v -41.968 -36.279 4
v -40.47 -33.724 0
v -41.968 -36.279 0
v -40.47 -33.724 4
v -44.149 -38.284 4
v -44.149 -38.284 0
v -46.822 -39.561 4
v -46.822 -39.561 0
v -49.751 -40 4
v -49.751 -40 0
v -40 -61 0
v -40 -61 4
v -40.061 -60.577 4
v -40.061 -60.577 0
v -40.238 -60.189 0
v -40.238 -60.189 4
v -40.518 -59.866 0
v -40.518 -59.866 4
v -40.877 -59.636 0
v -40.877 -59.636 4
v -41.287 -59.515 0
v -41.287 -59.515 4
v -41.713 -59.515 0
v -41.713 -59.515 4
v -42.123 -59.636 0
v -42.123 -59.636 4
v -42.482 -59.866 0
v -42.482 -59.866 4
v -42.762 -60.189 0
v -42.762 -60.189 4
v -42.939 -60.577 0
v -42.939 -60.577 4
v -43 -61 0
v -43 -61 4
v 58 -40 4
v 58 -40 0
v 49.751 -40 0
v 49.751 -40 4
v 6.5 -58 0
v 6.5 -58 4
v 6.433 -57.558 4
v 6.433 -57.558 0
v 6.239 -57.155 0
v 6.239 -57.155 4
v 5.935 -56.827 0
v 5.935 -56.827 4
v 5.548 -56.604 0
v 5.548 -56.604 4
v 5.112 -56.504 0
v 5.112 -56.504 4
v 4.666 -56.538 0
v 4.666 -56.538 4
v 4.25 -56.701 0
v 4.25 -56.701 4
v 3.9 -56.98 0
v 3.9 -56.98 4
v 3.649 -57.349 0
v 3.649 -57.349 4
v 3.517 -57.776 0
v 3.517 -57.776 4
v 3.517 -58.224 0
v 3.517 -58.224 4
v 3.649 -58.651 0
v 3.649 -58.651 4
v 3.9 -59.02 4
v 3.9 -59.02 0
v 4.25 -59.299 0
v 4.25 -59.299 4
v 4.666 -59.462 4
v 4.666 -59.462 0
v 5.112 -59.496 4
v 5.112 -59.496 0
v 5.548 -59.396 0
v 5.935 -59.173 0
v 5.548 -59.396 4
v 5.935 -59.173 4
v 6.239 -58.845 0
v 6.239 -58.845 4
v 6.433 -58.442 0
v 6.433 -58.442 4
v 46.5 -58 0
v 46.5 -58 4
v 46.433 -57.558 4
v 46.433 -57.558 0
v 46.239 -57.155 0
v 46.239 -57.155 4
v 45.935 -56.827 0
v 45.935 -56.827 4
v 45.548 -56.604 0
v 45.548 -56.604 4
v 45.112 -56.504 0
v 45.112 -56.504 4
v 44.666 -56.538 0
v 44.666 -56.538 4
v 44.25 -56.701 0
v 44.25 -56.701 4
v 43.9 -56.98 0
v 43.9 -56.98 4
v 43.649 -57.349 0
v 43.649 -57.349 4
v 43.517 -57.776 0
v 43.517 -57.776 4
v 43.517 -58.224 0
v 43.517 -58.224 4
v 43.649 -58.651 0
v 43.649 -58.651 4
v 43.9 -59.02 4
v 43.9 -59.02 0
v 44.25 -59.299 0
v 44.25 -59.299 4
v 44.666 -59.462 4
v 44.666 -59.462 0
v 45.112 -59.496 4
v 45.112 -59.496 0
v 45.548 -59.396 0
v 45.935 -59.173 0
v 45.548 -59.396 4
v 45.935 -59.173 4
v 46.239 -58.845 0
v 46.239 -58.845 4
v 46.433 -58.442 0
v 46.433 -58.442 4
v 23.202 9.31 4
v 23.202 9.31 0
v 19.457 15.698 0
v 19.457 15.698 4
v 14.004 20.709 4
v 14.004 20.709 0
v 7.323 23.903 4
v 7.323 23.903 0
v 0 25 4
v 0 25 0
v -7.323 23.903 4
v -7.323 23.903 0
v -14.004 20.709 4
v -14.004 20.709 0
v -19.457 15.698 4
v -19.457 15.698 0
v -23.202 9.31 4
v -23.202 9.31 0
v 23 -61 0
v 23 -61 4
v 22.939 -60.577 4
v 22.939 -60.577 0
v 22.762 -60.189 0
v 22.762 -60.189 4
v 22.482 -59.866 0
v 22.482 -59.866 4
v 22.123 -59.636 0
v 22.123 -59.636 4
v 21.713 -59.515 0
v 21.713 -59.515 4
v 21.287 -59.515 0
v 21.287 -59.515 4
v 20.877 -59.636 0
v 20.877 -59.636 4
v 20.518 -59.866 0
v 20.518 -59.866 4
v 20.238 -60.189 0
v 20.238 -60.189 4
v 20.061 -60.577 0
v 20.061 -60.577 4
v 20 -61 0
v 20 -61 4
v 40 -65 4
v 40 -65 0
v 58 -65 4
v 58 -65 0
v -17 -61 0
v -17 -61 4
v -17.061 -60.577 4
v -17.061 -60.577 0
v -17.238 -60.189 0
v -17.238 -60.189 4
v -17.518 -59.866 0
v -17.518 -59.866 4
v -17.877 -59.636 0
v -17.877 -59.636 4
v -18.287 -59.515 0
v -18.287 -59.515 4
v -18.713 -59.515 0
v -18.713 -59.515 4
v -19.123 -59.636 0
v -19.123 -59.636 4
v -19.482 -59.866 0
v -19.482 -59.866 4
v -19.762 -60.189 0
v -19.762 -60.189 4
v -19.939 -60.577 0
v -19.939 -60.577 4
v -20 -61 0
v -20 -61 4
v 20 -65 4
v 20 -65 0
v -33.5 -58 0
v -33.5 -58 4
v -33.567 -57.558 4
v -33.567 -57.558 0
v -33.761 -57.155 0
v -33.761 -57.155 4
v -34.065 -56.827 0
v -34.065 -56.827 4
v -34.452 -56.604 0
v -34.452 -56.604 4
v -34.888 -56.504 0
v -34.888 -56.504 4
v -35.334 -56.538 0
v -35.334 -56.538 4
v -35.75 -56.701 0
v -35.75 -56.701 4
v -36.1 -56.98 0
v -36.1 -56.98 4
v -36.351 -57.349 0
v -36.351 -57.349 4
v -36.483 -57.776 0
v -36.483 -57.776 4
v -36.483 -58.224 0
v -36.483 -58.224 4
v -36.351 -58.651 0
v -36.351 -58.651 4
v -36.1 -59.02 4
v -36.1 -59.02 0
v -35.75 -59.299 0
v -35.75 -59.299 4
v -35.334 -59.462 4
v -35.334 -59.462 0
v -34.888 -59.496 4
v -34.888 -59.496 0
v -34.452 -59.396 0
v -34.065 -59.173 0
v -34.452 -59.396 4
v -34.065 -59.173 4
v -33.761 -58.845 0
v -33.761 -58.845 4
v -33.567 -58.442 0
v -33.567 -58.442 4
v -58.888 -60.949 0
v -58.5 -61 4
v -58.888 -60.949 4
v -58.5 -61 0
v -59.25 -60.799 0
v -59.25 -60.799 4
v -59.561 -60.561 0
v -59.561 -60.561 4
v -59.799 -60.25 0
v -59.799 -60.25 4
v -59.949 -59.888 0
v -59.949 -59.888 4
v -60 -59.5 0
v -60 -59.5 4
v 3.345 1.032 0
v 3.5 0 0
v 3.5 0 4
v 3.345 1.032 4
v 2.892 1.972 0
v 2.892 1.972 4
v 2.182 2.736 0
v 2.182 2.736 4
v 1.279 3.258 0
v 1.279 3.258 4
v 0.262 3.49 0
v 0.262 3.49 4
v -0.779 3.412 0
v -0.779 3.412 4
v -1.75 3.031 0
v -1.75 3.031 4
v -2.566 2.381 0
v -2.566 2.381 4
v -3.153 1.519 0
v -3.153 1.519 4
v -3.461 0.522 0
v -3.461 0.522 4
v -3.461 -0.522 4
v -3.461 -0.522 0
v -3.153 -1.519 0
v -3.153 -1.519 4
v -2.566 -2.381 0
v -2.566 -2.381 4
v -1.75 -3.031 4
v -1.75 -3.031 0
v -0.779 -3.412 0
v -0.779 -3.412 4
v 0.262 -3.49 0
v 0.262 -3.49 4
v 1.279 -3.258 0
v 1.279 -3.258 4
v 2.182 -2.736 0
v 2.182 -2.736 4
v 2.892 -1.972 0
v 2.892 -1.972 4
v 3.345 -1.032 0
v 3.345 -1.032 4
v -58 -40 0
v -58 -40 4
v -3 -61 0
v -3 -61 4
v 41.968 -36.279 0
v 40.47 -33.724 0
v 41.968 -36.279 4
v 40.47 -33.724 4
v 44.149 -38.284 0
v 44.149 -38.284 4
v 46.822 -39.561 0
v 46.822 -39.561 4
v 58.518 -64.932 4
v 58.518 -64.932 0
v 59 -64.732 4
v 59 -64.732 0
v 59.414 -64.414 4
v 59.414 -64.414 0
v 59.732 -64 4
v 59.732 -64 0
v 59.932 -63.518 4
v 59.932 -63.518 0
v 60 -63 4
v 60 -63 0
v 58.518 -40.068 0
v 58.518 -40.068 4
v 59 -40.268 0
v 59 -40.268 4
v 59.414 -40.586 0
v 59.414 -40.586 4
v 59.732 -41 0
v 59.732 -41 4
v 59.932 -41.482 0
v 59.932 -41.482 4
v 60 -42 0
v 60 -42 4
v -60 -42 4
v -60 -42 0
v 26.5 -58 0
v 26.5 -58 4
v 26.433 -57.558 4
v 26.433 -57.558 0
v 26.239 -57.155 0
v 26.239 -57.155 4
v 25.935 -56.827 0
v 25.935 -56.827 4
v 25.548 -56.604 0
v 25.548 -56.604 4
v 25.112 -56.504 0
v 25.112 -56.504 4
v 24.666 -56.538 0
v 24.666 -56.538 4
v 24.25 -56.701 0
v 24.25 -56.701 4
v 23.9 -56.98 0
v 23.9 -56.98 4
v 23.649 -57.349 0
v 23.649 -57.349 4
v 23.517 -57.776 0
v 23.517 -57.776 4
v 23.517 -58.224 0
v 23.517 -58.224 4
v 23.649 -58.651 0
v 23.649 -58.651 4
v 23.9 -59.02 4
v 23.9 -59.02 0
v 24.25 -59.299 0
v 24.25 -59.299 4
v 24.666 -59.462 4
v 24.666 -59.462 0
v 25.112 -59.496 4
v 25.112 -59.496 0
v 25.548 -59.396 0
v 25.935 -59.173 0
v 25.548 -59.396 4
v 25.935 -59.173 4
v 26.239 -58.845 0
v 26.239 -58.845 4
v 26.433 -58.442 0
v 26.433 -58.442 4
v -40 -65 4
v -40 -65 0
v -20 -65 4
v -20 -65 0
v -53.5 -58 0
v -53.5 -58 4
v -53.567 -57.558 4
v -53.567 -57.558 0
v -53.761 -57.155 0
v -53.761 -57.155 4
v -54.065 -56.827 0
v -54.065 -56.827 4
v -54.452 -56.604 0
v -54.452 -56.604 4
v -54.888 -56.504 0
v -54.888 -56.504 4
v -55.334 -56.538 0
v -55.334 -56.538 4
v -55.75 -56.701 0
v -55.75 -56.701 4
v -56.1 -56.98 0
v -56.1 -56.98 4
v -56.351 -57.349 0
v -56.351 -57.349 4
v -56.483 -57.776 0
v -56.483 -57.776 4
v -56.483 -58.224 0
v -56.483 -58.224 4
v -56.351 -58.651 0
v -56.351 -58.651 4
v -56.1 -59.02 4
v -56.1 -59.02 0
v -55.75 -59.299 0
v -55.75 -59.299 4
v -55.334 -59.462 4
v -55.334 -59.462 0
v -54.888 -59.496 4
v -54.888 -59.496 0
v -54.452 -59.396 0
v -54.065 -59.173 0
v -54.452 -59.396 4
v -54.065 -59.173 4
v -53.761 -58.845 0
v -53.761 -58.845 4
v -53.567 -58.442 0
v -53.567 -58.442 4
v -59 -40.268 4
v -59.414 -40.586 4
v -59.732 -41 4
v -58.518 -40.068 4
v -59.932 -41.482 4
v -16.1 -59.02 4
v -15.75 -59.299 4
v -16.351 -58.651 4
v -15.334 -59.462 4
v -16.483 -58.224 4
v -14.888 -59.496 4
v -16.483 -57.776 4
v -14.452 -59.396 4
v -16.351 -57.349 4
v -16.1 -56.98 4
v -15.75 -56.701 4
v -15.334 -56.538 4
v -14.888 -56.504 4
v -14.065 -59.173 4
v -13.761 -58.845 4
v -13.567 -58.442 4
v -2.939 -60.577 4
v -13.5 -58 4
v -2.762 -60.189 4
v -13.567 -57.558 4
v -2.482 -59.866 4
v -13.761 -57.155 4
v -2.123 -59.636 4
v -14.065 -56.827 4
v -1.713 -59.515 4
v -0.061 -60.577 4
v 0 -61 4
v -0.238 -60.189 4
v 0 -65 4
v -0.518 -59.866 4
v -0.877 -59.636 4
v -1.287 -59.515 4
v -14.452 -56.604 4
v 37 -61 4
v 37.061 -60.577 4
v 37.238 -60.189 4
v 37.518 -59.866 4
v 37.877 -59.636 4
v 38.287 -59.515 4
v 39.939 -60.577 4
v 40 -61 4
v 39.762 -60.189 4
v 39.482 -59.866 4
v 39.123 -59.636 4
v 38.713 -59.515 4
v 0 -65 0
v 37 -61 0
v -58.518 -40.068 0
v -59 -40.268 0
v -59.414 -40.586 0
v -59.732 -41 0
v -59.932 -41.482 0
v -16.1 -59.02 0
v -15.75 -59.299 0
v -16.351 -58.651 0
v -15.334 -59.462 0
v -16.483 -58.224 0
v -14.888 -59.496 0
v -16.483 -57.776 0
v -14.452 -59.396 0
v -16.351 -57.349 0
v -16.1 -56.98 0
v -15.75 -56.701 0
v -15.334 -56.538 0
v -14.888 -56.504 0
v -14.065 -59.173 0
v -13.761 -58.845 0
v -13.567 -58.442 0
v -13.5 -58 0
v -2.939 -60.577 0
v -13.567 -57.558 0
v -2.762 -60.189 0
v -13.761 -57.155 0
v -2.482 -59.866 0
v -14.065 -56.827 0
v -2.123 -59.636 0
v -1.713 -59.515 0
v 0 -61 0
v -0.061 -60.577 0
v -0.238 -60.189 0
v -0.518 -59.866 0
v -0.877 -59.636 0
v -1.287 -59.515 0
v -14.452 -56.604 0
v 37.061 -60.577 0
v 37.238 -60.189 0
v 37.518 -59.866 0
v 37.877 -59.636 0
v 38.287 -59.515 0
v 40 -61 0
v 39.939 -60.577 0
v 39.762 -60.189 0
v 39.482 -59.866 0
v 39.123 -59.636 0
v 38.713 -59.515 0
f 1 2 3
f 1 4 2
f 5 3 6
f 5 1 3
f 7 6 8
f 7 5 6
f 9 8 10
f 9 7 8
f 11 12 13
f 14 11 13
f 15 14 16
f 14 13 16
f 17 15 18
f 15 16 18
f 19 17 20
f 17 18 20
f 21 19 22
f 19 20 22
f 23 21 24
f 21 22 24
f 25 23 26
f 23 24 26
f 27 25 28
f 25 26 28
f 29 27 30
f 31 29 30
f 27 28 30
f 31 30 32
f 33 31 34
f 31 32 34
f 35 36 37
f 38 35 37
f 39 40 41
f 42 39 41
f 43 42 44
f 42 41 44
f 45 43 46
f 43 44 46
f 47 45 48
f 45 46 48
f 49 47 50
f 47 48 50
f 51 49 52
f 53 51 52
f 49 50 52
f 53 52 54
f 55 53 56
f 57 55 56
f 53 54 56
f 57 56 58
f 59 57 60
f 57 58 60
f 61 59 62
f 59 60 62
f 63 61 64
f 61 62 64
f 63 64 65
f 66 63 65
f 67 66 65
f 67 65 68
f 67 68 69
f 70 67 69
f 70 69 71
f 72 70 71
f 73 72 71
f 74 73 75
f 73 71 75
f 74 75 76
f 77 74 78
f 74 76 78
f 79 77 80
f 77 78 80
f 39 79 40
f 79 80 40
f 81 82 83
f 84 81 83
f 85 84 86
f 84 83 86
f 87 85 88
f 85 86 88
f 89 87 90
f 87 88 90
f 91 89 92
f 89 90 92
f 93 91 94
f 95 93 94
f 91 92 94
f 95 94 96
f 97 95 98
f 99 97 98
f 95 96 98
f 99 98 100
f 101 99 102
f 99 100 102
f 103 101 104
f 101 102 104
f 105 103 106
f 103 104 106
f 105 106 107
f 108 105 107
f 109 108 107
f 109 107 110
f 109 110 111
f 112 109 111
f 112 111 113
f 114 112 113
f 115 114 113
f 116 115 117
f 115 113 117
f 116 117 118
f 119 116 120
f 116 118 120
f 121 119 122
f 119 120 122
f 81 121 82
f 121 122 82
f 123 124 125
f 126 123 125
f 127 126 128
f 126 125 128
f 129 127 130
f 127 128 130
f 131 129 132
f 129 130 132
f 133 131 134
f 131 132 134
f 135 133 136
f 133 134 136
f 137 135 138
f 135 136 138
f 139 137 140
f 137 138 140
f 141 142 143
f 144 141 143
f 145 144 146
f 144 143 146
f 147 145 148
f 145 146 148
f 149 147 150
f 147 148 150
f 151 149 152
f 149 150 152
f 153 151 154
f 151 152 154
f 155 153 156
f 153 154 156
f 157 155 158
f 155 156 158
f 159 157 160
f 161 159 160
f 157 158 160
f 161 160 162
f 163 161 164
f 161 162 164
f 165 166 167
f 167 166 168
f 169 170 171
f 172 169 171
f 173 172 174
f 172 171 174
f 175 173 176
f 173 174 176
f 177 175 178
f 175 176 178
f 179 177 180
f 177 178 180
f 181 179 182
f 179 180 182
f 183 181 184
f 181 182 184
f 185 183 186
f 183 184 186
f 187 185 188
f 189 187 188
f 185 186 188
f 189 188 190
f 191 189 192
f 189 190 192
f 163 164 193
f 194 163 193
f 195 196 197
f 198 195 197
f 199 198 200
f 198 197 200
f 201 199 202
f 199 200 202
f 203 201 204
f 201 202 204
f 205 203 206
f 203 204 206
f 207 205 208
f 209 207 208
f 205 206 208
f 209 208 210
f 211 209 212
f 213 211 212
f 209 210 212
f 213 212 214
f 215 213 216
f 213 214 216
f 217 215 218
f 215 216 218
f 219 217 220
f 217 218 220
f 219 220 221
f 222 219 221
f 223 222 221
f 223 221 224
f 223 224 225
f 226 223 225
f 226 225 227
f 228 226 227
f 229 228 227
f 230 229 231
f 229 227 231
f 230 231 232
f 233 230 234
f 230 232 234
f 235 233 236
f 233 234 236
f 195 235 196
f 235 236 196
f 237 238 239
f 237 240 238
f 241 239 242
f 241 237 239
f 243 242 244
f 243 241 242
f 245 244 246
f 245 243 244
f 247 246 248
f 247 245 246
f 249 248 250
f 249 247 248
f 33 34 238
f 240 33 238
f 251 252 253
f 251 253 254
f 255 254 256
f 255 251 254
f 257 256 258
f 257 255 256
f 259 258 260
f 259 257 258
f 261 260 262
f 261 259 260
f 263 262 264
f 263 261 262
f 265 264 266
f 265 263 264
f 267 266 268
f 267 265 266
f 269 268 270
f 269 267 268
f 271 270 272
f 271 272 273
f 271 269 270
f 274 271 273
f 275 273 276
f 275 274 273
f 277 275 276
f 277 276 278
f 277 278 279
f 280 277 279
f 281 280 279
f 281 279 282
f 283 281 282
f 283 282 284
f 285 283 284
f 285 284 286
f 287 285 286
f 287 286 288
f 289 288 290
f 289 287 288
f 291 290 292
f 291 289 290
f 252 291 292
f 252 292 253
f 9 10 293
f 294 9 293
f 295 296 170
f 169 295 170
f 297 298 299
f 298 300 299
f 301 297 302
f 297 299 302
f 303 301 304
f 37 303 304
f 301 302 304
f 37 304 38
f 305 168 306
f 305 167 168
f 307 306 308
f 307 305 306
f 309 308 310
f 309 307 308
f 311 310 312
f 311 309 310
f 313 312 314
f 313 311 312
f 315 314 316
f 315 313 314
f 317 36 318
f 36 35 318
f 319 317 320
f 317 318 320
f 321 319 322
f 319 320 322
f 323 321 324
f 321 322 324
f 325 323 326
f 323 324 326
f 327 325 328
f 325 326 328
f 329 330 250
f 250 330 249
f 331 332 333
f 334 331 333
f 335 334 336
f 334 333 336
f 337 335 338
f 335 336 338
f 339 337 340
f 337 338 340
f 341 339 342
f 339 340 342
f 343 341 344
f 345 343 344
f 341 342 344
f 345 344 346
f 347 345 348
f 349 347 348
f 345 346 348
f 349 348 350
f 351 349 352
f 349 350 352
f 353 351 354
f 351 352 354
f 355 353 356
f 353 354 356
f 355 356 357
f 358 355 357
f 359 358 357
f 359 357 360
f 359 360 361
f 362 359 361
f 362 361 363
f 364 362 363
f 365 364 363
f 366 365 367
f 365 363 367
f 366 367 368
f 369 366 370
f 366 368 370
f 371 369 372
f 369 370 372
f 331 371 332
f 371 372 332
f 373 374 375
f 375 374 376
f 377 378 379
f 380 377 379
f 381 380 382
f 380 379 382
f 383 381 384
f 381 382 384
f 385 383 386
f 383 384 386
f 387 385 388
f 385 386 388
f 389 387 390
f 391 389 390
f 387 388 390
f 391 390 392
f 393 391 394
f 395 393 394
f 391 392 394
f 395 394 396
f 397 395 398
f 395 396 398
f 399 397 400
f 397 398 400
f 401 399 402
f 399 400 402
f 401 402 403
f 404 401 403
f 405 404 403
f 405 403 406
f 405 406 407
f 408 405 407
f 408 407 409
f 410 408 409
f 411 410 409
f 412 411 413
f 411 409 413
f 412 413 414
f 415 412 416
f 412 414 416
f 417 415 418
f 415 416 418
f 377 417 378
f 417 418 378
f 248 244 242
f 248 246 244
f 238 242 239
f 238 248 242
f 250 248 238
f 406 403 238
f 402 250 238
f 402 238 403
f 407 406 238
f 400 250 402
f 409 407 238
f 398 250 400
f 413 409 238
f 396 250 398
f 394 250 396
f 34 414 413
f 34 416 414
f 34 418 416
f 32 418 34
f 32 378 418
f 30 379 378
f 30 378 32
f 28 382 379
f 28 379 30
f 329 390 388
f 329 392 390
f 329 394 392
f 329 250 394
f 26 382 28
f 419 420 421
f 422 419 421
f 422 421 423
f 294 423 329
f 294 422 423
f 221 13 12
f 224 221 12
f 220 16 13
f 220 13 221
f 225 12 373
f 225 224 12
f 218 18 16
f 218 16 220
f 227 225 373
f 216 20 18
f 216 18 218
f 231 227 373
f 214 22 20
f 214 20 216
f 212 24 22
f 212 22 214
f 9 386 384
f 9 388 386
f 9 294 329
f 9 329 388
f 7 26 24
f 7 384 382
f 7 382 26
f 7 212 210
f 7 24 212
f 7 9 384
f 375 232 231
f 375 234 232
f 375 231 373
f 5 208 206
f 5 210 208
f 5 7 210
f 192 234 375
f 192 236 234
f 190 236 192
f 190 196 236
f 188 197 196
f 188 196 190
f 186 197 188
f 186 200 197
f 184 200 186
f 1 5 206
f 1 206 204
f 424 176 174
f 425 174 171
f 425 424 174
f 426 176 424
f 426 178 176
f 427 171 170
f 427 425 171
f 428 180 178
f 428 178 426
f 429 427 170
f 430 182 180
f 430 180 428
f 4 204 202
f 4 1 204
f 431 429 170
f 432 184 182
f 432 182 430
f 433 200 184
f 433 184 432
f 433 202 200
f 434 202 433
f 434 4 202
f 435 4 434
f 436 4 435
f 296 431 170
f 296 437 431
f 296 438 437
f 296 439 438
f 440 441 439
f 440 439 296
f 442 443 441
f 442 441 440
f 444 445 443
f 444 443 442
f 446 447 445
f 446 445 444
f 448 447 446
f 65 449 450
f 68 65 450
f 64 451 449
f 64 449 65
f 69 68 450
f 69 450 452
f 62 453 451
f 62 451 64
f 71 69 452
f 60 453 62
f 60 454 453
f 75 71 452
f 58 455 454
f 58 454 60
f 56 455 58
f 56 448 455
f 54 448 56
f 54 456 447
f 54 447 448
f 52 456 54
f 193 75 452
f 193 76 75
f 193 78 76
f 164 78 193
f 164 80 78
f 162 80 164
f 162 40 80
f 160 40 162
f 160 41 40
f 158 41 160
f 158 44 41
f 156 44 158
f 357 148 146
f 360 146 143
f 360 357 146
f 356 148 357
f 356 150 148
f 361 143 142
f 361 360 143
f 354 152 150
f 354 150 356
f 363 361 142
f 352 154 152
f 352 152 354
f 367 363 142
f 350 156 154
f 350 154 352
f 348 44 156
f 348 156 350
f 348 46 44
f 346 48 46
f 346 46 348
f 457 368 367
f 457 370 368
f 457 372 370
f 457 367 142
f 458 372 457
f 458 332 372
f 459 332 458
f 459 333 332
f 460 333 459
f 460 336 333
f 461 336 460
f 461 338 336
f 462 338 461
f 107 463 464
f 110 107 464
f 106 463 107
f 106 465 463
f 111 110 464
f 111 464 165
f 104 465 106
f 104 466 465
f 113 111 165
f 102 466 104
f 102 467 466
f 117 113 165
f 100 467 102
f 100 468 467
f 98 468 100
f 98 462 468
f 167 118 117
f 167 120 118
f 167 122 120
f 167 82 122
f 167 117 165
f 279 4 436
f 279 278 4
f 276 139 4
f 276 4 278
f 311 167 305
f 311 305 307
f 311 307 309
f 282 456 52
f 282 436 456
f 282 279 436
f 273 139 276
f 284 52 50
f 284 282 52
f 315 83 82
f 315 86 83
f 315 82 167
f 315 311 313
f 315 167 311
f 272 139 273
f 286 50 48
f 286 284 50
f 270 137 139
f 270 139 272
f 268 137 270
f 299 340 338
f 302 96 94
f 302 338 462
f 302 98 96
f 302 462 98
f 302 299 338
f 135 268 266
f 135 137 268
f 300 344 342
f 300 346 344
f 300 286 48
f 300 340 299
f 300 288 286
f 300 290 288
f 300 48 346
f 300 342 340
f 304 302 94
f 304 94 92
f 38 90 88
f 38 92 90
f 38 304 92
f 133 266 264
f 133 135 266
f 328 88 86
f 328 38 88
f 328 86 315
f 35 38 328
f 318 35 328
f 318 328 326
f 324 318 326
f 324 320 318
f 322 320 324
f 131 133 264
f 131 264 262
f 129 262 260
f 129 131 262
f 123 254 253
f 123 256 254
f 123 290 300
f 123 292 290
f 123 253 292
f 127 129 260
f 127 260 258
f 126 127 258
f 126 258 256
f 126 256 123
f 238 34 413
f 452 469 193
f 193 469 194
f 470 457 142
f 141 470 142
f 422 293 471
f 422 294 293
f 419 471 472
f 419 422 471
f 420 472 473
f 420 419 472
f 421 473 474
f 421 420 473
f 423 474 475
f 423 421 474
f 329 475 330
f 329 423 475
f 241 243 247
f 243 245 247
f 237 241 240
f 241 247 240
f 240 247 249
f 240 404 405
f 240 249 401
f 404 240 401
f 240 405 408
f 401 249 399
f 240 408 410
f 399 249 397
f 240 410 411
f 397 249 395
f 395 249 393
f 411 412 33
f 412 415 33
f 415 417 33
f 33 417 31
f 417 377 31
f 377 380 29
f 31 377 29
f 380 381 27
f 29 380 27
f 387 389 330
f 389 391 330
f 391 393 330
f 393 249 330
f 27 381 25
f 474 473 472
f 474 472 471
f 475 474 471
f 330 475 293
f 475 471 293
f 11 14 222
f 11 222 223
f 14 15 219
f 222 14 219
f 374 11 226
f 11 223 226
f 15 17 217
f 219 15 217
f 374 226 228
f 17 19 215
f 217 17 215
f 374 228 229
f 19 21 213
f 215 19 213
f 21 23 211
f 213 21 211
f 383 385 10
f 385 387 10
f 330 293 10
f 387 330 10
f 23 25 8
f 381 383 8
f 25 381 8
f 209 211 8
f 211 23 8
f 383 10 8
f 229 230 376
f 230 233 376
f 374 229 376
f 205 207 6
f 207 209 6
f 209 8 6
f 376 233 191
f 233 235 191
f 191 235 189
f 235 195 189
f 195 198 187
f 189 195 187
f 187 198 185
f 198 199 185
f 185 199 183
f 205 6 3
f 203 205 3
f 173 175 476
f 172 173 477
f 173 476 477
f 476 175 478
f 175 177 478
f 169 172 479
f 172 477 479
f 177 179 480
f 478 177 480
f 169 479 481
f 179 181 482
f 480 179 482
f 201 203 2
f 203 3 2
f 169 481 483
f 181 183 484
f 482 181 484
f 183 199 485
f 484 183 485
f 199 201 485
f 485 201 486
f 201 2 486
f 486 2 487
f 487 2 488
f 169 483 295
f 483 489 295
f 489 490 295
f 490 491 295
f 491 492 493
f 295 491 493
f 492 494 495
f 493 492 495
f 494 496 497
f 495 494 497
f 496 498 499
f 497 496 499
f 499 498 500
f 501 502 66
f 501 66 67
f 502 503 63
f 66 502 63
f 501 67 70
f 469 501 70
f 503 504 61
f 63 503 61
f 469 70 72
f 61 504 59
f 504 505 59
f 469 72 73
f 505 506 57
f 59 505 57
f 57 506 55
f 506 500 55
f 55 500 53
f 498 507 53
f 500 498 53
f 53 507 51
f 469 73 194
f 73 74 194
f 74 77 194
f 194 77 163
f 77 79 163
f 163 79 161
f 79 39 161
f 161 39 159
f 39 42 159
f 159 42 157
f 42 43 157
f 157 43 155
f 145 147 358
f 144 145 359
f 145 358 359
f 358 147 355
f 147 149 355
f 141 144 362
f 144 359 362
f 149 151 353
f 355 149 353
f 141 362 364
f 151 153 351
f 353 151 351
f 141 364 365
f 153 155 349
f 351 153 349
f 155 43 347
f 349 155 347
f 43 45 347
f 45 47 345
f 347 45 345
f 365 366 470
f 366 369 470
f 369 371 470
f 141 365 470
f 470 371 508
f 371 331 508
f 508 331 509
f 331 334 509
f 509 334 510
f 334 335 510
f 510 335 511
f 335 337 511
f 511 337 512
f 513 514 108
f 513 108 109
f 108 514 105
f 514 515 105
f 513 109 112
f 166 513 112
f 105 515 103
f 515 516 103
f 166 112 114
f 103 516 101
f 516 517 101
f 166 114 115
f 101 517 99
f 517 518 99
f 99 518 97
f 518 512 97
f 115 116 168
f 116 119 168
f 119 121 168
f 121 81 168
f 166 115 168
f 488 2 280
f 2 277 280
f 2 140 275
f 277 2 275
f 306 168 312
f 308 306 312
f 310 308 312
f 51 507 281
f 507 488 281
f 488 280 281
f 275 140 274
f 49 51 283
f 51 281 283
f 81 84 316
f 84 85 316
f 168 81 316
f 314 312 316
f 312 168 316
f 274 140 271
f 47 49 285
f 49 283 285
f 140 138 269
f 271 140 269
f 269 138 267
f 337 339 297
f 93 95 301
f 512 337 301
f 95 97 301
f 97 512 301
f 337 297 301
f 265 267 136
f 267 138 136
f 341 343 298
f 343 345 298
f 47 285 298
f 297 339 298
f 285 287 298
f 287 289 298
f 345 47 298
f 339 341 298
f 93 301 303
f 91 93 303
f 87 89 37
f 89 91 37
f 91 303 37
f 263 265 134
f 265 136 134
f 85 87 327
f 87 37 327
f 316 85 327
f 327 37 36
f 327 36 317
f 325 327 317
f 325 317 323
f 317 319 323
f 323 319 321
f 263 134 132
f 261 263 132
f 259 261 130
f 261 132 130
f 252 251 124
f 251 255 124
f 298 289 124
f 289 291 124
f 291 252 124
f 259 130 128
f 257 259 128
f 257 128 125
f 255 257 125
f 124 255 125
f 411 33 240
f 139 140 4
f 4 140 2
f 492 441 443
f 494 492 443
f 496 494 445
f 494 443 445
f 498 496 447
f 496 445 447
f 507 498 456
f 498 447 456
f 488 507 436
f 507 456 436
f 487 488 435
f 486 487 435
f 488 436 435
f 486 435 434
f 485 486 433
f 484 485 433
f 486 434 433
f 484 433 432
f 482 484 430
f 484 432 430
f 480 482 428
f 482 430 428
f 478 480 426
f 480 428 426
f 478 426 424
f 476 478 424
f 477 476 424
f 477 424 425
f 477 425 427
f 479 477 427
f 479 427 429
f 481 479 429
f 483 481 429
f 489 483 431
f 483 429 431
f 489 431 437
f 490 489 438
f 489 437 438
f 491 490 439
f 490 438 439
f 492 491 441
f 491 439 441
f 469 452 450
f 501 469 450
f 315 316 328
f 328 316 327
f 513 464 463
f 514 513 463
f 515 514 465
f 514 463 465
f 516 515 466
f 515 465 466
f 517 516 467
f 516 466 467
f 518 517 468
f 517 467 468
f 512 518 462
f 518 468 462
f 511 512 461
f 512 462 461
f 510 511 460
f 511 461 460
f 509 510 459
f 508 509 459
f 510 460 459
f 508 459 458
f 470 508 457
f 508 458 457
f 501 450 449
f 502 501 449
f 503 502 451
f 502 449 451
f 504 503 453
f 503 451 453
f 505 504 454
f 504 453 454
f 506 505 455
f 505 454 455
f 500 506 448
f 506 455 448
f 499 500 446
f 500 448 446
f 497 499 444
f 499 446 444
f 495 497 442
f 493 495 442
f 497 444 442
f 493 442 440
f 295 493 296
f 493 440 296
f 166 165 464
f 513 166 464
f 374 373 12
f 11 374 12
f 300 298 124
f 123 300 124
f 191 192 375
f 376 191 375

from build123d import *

# Parameters (mm, degrees)
SKETCH_1_R          = 3.5
EXTRUDE_1_DEPTH     = 4
FILLET_1_R          = 10
FILLET_2_R          = 2
CUT_EXTRUDE_1_DEPTH = 10
FILLET_3_R          = 1.5
SKETCH_3_R          = 1.5
CUT_EXTRUDE_2_DEPTH = 4


with BuildPart() as part:
    # 草图1 → 凸台-拉伸1 (new body)
    # profile 1 of 2: a face of its own
    with BuildSketch(Plane.XY):
        with BuildLine():
            ThreePointArc((23.201709249, 9.310246395), (0, 25), (-23.201709249, 9.310246395))
            ThreePointArc((-23.201709249, 9.310246395), (-4.741163822, -24.546310631), (25, 0))
            ThreePointArc((25, 0), (24.546310631, 4.741163822), (23.201709249, 9.310246395))
        make_face()
        Circle(SKETCH_1_R, mode=Mode.SUBTRACT)
    # profile 2 of 2: a face of its own
    with BuildSketch(Plane.XY):
        with BuildLine():
            ThreePointArc((25, 0), (-4.741163822, -24.546310631), (-23.201709249, 9.310246395))
            Line((-23.201709249, 9.310246395), (-42.988636962, -40))
            Line((-42.988636962, -40), (-60, -40))
            Line((-60, -40), (-60, -65))
            Line((-60, -65), (60, -65))
            Line((60, -65), (60, -40))
            Line((60, -40), (42.988636962, -40))
            Line((42.988636962, -40), (23.201709249, 9.310246395))
            ThreePointArc((23.201709249, 9.310246395), (24.546310631, 4.741163822), (25, 0))
        make_face()
    extrude(amount=EXTRUDE_1_DEPTH)

    # 圆角1
    fillet_1_edges = [part.edges().sort_by_distance(p)[0] for p in [
        (42.988636962, -40, 2),
        (-42.988636962, -40, 2),
    ]]
    fillet(fillet_1_edges, radius=FILLET_1_R)

    # 圆角2
    fillet_2_edges = [part.edges().sort_by_distance(p)[0] for p in [
        (60, -40, 2),
        (60, -65, 2),
        (-60, -65, 2),
        (-60, -40, 2),
    ]]
    fillet(fillet_2_edges, radius=FILLET_2_R)

    # 草图2 → 切除-拉伸1 (cut)
    with BuildSketch(Plane.XY.offset(4)):
        with BuildLine():
            Line((-43, -61), (-40, -61))
            ThreePointArc((-40, -61), (-41.5, -59.5), (-43, -61))
        make_face()
        with BuildLine():
            ThreePointArc((-60, -63), (-59.414213562, -64.414213562), (-58, -65))
            Line((-58, -65), (-40, -65))
            Line((-40, -65), (-40, -61))
            Line((-40, -61), (-43, -61))
            Line((-43, -61), (-60, -61))
            Line((-60, -61), (-60, -63))
        make_face()
        with BuildLine():
            ThreePointArc((-17, -61), (-18.5, -59.5), (-20, -61))
            Line((-20, -61), (-17, -61))
        make_face()
        Polygon((-20, -61), (-20, -65), (0, -65), (0, -61), (-3, -61), (-17, -61), align=None)
        with BuildLine():
            Line((-3, -61), (0, -61))
            ThreePointArc((0, -61), (-1.5, -59.5), (-3, -61))
        make_face()
        with BuildLine():
            ThreePointArc((23, -61), (21.5, -59.5), (20, -61))
            Line((20, -61), (23, -61))
        make_face()
        Polygon((20, -61), (20, -65), (40, -65), (40, -61), (37, -61), (23, -61), align=None)
        with BuildLine():
            Line((37, -61), (40, -61))
            ThreePointArc((40, -61), (38.5, -59.5), (37, -61))
        make_face()
    extrude(amount=-CUT_EXTRUDE_1_DEPTH, mode=Mode.SUBTRACT)

    # 圆角3
    fillet_3_edges = [part.edges().sort_by_distance(p)[0] for p in [
        (-60, -61, 2),
    ]]
    fillet(fillet_3_edges, radius=FILLET_3_R)

    # 草图3 → 切除-拉伸2 (cut)
    with BuildSketch(Plane.XY.offset(4)):
        with Locations((-55, -58)):
            Circle(SKETCH_3_R)
        with Locations((-35, -58)):
            Circle(SKETCH_3_R)
        with Locations((-15, -58)):
            Circle(SKETCH_3_R)
        with Locations((5, -58)):
            Circle(SKETCH_3_R)
        with Locations((25, -58)):
            Circle(SKETCH_3_R)
        with Locations((45, -58)):
            Circle(SKETCH_3_R)
    extrude(amount=-CUT_EXTRUDE_2_DEPTH, mode=Mode.SUBTRACT)


solid = part.part
